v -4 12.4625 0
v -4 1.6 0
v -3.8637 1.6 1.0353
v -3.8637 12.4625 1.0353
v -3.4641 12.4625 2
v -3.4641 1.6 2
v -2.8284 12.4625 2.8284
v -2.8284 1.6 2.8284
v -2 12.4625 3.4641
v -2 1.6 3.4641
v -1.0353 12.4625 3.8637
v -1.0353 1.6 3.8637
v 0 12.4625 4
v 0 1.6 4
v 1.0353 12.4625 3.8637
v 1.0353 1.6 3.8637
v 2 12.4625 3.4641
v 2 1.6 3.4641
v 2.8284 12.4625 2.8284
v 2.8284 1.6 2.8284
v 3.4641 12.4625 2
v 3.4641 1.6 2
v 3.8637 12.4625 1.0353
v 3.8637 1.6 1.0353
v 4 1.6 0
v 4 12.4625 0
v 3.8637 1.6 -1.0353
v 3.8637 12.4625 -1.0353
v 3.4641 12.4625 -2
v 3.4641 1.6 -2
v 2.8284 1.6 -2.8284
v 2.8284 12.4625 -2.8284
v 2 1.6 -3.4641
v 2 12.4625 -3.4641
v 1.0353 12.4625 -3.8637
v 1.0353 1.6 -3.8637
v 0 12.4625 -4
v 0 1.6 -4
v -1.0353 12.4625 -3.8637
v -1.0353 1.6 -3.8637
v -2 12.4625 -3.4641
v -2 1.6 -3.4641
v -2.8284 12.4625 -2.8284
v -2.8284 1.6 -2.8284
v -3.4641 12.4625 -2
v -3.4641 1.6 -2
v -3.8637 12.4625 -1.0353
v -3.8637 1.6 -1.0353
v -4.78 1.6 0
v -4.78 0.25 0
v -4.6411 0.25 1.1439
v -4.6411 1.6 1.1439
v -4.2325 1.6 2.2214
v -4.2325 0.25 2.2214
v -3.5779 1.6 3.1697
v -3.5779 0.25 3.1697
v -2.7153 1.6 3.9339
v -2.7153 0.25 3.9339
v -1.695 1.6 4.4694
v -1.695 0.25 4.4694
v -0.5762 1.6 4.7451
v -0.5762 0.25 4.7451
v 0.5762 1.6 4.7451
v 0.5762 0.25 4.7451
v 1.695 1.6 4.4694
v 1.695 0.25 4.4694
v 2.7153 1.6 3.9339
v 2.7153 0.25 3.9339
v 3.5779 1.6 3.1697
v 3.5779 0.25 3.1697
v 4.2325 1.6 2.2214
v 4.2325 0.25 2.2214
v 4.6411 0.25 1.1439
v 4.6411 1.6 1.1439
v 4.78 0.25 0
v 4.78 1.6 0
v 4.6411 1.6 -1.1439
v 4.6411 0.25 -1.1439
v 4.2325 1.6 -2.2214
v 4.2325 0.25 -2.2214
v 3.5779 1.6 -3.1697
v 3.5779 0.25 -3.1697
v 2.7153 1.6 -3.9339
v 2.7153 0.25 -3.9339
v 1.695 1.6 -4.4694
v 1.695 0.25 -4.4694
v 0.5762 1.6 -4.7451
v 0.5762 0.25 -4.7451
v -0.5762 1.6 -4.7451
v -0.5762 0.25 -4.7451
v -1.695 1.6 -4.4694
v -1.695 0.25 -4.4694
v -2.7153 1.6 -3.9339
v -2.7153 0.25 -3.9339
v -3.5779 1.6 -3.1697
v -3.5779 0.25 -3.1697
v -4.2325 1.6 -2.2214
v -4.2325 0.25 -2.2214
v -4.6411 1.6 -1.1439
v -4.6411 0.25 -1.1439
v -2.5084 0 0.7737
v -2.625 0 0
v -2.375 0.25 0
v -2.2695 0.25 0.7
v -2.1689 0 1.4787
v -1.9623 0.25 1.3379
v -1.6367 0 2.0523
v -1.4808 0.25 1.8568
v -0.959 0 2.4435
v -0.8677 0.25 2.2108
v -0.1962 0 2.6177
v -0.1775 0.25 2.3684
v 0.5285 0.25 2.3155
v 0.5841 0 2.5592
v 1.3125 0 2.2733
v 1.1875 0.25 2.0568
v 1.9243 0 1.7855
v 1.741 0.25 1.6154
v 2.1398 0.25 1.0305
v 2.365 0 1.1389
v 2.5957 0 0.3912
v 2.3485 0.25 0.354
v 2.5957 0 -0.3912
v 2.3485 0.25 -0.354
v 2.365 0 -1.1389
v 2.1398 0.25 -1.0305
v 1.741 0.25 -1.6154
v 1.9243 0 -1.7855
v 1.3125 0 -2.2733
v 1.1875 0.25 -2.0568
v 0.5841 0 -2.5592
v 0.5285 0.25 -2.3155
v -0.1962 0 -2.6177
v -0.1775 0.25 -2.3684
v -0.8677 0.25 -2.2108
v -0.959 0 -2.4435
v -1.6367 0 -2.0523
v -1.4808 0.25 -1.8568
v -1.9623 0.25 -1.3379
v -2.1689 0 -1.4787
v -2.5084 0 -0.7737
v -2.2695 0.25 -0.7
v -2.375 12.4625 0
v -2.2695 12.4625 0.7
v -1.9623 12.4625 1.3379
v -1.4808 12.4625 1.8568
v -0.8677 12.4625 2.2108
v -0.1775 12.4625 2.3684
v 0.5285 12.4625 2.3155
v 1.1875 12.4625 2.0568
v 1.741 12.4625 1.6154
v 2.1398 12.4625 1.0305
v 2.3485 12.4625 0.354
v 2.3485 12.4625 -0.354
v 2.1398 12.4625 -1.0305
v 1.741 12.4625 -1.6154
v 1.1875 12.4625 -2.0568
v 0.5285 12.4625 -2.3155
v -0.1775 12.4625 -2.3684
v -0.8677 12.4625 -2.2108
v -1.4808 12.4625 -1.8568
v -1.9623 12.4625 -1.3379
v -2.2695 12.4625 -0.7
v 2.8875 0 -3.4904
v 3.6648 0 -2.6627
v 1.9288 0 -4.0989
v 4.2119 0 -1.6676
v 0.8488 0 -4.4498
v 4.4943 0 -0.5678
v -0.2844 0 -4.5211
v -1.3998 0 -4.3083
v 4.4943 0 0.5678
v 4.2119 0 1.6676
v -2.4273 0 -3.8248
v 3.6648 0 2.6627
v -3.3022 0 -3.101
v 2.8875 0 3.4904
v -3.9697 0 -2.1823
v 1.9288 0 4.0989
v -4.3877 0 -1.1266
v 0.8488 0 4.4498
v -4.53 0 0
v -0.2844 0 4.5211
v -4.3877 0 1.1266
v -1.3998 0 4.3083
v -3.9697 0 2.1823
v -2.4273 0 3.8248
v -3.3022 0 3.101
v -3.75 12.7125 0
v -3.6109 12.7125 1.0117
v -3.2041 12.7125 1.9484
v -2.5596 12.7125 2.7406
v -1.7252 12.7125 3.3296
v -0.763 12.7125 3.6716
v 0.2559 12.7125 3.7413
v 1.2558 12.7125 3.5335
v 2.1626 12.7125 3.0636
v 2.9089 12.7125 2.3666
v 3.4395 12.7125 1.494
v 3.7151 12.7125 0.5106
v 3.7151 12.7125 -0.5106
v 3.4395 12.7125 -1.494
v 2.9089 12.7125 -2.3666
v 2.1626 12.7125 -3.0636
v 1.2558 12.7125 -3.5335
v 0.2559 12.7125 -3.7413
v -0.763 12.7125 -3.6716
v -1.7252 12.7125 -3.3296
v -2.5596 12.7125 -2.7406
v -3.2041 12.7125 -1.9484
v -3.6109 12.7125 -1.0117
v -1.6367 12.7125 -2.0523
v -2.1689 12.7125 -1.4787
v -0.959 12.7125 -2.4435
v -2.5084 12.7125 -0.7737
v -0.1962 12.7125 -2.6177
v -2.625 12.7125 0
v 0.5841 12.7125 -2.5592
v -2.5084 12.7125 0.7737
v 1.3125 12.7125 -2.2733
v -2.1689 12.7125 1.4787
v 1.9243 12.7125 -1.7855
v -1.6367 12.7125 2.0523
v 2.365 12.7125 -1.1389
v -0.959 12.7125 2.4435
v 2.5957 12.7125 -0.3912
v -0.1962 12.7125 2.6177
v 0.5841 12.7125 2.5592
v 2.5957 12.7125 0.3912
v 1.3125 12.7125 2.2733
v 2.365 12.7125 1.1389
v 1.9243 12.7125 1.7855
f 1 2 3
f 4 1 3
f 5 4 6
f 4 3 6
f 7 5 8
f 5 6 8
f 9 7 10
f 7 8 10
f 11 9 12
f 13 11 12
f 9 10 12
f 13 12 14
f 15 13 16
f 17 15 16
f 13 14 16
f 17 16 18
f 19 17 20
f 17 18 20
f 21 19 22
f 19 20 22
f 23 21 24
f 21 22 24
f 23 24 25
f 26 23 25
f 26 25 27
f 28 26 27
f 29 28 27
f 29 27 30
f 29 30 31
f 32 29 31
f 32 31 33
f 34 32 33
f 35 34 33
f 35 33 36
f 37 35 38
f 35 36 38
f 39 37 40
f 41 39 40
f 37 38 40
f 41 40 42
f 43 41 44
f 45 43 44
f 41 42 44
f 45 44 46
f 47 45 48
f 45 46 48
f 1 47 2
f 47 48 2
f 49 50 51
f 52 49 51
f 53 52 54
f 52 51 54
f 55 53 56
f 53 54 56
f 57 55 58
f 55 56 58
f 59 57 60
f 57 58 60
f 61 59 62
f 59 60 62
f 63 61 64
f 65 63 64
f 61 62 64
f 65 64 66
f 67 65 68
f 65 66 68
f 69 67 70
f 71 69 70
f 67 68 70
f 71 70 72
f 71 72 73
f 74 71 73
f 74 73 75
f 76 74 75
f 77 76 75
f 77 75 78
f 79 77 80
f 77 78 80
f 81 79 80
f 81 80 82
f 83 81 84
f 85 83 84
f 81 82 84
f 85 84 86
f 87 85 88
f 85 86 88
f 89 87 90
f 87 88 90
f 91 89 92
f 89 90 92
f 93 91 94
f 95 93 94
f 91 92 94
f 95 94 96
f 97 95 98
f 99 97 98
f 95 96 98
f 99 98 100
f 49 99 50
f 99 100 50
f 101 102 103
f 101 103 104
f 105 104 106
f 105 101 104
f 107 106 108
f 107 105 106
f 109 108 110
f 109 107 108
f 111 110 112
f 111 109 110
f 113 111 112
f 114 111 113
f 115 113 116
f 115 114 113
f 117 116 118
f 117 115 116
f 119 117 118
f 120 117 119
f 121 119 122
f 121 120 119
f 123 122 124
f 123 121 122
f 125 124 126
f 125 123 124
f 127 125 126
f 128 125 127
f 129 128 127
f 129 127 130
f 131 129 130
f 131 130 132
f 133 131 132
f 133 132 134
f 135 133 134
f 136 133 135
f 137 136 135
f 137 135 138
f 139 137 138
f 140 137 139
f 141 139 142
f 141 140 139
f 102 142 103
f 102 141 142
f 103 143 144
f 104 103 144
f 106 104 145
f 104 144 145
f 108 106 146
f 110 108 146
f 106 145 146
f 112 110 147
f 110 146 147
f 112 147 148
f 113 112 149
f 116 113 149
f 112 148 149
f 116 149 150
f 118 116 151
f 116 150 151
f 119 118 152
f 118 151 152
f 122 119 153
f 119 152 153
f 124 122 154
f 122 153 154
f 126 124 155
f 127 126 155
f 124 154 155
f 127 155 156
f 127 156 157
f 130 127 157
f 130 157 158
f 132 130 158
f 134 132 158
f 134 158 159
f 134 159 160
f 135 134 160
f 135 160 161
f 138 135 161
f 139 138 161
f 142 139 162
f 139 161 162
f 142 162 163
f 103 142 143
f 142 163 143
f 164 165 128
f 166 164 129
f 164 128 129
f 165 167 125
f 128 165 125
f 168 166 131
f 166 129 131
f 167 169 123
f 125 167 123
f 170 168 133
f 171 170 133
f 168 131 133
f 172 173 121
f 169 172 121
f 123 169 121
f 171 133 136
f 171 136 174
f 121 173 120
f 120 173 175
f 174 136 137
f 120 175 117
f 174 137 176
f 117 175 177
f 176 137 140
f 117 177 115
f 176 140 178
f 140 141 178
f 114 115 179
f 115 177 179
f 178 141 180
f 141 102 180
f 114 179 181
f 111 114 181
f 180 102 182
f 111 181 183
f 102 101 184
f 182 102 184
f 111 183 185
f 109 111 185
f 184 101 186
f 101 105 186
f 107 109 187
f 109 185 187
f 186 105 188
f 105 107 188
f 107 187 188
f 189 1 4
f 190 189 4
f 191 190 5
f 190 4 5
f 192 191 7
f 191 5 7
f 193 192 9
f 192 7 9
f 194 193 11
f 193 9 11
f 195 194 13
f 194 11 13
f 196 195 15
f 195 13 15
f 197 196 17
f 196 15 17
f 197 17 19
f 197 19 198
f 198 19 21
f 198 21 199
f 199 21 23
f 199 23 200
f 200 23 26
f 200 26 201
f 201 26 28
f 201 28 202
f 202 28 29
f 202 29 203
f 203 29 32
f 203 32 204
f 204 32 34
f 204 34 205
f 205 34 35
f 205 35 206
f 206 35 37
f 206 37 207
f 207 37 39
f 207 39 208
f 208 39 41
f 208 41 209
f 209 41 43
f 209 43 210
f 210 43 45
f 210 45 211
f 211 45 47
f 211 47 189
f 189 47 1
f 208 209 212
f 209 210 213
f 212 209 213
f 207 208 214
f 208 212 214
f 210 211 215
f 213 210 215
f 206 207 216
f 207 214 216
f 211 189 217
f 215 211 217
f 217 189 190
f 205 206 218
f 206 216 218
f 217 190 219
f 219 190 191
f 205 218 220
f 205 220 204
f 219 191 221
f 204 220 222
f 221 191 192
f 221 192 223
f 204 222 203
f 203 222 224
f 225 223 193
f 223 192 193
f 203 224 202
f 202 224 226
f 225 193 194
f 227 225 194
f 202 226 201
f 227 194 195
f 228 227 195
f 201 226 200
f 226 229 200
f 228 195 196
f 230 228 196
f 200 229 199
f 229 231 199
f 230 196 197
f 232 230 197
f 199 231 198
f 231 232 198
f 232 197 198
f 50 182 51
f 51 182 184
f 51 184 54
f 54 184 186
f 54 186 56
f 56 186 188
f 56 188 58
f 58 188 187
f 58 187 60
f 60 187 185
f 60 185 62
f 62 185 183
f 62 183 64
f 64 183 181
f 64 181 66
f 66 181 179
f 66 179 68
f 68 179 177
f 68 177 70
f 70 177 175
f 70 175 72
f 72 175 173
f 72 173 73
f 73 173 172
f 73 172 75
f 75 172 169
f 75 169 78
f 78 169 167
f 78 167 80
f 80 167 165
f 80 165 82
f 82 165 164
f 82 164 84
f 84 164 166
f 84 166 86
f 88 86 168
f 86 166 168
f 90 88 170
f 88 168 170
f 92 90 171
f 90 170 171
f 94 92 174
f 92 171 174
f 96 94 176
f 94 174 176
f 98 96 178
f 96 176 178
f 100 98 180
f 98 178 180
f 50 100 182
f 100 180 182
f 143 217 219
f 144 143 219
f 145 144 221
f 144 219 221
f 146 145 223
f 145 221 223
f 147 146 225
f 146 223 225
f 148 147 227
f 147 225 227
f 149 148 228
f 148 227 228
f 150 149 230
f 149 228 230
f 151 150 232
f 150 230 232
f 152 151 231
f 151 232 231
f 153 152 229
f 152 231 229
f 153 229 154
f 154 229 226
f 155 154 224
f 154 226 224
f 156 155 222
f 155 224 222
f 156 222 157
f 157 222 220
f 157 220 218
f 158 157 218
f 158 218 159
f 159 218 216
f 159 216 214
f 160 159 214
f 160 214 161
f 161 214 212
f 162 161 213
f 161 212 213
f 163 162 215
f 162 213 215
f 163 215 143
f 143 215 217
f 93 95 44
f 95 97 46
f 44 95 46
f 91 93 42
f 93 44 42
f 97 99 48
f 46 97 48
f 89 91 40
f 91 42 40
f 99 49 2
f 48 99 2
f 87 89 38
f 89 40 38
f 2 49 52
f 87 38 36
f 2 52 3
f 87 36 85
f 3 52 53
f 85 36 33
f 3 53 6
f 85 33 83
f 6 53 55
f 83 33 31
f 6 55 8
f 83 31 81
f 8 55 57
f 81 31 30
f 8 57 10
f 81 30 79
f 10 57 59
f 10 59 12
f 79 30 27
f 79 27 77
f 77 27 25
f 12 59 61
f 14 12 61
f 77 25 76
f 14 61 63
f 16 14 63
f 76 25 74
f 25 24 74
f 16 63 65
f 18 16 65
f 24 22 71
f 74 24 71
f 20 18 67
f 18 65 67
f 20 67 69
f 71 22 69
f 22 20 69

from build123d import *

# Parameters (mm, degrees)
CHAMFER1_SIZE = 0.25


with BuildPart() as part:
    # Sketch1 → Revolve1 (revolve)
    with BuildSketch(Plane.XY):
        Polygon((-2.375, 0), (-2.375, 12.7125), (-4, 12.7125), (-4, 1.6), (-4.78, 1.6), (-4.78, 0), align=None)
    revolve(axis=Axis((0, 0, 0), (0, 1, 0)))

    # Chamfer1
    chamfer1_edges = [part.edges().sort_by_distance(p)[0] for p in [
        (4.78, 0, 0),
        (4, 12.7125, 0),
        (2.375, 12.7125, 0),
        (2.375, 0, 0),
    ]]
    chamfer(chamfer1_edges, length=CHAMFER1_SIZE)


solid = part.part
